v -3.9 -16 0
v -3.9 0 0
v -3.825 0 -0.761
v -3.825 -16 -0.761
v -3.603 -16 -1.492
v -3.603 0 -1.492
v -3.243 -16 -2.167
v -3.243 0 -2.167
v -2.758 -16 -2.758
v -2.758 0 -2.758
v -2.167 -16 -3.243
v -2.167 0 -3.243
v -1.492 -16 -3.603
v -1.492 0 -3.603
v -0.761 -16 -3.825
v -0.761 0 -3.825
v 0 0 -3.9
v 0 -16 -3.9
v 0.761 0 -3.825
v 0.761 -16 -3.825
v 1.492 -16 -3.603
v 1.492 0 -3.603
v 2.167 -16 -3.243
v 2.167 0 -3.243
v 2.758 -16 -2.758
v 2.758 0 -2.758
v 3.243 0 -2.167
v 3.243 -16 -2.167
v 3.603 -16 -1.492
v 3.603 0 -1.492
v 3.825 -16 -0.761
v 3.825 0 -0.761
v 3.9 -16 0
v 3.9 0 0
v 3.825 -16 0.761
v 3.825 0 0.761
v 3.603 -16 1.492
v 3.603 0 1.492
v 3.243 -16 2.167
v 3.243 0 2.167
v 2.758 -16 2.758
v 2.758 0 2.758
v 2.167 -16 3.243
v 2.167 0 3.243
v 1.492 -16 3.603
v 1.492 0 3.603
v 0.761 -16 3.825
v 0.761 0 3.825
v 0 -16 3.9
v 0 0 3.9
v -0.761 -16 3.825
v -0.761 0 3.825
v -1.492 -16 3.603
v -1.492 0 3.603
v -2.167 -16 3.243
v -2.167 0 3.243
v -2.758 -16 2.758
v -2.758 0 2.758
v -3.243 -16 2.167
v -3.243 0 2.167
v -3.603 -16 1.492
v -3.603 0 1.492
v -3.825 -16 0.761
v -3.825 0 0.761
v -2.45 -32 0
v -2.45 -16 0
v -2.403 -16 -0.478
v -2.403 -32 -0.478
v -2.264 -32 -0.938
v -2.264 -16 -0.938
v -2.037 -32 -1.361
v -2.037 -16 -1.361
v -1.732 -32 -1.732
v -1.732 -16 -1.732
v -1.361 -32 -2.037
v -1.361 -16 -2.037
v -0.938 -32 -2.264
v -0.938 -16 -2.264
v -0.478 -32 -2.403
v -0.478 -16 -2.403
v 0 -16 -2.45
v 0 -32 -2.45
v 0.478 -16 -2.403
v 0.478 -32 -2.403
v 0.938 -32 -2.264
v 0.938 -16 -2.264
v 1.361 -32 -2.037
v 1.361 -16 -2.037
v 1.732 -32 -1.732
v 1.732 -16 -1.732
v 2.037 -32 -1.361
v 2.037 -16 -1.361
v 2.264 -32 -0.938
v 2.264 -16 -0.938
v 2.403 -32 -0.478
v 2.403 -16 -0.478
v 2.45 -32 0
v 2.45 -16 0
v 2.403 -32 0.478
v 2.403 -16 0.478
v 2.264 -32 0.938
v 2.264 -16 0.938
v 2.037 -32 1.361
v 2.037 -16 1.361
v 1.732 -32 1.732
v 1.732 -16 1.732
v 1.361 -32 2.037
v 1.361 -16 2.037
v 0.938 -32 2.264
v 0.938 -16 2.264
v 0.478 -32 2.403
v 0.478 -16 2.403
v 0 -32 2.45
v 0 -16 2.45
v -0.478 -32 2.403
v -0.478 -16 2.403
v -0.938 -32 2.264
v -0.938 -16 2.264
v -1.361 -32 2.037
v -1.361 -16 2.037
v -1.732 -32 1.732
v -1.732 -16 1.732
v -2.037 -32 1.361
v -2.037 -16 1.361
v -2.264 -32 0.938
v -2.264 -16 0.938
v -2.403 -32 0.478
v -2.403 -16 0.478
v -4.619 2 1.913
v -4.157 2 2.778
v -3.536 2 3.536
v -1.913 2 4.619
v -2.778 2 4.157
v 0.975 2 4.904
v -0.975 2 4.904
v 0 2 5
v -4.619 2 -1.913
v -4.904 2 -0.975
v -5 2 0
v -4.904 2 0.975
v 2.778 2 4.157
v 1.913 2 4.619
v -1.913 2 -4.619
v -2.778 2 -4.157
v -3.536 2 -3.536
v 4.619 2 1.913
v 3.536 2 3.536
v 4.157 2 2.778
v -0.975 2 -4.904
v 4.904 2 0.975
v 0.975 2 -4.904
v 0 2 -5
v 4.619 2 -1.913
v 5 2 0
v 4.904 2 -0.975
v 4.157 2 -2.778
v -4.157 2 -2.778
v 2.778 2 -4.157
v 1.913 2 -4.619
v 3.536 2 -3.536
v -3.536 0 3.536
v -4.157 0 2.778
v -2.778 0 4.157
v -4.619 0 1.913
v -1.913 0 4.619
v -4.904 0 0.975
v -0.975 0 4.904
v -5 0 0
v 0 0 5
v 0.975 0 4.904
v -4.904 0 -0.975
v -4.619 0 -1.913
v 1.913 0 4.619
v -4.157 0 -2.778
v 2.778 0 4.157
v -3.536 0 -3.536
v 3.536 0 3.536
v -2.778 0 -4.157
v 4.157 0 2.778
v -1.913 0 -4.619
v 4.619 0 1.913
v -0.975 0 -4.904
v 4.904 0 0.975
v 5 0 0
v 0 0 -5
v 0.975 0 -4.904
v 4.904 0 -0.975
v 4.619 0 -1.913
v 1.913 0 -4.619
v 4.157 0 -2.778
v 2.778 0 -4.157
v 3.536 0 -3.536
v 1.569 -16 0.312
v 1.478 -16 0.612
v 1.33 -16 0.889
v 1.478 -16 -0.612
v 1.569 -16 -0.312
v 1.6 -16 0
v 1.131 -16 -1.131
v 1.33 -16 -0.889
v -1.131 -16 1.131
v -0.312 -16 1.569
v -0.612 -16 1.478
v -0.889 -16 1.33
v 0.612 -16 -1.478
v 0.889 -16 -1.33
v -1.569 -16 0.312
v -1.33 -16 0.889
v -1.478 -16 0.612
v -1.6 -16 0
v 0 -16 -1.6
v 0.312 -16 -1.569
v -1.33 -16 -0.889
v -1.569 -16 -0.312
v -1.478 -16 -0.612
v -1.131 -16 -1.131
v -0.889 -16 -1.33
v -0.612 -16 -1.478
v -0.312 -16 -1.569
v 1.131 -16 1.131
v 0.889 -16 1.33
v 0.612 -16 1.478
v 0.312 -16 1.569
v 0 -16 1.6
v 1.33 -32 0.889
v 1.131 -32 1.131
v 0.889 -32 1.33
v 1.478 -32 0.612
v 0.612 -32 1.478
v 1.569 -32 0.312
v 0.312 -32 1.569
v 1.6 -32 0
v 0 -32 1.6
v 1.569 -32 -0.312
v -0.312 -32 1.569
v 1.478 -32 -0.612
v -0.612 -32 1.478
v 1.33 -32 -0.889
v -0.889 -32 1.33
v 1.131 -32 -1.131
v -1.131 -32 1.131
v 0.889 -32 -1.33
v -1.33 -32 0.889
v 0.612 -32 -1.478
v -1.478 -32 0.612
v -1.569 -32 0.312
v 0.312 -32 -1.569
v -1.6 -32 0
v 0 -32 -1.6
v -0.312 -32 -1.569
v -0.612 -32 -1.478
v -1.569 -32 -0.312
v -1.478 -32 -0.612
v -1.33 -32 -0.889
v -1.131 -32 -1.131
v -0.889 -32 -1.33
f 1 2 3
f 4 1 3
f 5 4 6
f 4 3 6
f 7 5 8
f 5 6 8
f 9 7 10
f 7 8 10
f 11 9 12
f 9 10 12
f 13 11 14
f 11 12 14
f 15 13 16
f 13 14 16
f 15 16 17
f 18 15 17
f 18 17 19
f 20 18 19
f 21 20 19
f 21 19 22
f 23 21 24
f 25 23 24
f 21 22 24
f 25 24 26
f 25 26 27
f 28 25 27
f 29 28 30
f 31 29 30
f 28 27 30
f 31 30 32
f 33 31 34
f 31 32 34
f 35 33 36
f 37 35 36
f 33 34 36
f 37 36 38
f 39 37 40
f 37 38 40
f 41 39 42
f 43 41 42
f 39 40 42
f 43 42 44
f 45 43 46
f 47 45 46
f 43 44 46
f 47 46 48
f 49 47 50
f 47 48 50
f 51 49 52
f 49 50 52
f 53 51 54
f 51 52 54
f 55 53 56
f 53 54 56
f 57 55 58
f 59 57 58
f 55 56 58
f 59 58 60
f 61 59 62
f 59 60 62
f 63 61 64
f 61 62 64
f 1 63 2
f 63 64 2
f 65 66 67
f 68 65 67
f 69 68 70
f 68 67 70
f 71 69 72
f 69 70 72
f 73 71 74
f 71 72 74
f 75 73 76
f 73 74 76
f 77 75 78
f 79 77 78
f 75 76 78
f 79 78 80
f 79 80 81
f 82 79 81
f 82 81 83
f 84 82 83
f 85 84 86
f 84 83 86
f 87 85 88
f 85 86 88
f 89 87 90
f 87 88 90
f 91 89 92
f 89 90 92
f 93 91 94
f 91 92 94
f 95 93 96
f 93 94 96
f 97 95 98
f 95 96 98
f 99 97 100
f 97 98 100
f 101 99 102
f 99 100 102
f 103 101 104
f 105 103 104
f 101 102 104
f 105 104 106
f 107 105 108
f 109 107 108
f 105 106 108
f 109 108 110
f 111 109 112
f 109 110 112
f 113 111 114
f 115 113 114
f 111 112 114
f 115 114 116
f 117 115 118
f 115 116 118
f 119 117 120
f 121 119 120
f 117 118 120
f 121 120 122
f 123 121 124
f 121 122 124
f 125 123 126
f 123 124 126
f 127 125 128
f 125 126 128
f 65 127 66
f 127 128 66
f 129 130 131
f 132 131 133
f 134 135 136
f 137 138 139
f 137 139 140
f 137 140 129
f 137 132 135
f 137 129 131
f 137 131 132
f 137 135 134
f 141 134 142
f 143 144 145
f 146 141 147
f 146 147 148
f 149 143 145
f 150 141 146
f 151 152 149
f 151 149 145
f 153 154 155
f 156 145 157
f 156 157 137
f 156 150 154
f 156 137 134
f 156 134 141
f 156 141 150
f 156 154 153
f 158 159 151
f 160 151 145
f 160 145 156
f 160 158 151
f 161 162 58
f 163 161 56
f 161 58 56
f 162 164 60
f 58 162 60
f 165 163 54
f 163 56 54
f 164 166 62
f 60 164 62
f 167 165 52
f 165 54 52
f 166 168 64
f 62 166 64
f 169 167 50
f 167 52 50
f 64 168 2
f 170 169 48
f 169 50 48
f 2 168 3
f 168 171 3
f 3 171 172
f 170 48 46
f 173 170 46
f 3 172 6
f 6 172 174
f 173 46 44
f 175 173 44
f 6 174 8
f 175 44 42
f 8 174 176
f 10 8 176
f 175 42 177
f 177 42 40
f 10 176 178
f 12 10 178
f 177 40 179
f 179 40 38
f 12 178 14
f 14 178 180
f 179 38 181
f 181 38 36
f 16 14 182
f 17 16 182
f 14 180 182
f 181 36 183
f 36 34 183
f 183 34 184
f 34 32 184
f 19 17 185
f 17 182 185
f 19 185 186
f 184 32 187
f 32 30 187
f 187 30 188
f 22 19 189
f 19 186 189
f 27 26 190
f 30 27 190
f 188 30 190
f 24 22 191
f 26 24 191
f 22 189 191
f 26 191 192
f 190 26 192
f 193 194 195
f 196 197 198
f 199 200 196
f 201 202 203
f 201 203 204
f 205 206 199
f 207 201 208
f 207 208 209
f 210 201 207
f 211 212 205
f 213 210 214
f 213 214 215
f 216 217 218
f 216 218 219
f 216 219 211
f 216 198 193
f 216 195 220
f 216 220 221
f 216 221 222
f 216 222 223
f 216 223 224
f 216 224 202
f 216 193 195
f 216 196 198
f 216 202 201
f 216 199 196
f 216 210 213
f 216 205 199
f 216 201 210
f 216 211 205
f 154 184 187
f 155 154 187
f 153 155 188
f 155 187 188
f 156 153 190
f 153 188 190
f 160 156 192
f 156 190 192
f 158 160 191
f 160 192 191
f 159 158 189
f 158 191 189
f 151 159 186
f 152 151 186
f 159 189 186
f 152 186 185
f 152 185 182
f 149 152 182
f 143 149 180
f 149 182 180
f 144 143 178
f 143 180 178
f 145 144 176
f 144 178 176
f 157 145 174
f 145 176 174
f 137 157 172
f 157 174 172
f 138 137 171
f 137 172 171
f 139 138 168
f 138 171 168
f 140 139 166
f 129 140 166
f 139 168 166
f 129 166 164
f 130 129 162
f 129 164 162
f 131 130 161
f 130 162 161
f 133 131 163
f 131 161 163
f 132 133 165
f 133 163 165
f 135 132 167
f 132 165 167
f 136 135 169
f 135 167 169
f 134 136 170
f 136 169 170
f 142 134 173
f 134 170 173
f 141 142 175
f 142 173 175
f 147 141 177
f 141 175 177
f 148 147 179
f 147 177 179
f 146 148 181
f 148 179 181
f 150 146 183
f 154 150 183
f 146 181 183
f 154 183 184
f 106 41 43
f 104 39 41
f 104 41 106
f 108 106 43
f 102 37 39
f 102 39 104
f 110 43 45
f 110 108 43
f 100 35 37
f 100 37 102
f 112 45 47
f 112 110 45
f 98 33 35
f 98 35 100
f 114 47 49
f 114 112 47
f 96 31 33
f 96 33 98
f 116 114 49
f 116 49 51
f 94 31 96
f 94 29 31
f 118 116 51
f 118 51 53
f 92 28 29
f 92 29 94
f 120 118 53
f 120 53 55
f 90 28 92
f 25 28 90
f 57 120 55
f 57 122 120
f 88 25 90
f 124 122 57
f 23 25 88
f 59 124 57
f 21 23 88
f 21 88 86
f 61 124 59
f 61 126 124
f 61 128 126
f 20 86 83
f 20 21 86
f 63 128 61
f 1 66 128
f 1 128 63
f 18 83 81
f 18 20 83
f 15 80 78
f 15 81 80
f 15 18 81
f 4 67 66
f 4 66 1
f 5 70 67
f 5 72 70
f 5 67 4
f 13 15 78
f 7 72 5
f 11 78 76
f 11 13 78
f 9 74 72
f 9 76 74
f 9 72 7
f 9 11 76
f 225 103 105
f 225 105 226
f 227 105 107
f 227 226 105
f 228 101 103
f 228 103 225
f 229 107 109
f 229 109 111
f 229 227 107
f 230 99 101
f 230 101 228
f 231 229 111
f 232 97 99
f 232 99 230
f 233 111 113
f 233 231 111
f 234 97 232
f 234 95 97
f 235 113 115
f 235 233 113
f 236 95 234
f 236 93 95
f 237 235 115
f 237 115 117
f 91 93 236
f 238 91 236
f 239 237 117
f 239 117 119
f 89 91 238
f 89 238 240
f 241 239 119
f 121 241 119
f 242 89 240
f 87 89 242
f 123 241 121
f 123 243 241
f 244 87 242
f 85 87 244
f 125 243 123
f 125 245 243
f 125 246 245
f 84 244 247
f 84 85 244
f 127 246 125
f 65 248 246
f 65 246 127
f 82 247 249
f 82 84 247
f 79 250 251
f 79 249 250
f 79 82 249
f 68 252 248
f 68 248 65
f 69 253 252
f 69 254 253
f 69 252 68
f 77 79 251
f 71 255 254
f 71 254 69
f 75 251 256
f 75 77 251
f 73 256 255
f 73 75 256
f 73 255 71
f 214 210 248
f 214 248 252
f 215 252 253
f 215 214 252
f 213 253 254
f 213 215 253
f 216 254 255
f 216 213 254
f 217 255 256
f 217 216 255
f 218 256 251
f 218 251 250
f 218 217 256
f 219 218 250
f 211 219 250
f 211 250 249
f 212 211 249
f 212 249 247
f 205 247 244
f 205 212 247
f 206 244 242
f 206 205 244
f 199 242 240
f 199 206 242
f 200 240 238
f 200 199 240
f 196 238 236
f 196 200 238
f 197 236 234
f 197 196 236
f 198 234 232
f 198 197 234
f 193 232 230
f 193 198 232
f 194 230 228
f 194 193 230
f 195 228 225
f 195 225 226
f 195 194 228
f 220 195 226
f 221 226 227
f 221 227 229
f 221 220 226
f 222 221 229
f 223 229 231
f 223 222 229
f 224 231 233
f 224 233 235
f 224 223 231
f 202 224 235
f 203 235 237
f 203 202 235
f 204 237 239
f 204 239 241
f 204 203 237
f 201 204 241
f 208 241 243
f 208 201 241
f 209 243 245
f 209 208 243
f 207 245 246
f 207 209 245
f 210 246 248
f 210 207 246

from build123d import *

# Parameters (mm, degrees)
SKETCH1_R           = 5
BOSS_EXTRUDE1_DEPTH = 2
SKETCH4_R           = 3.9
BOSS_EXTRUDE2_DEPTH = 16
SKETCH6_R           = 2.45
SKETCH6_R_2         = 1.6
BOSS_EXTRUDE3_DEPTH = 16


with BuildPart() as part:
    # Sketch1 → Boss-Extrude1 (new body)
    with BuildSketch(Plane(origin=(0, 0, 0), x_dir=(1, 0, 0), z_dir=(0, 1, 0))):
        Circle(SKETCH1_R)
    extrude(amount=BOSS_EXTRUDE1_DEPTH)

    # Sketch4 → Boss-Extrude2 (add)
    with BuildSketch(Plane(origin=(0, 0, 0), x_dir=(-1, 0, 0), z_dir=(0, -1, 0))):
        Circle(SKETCH4_R)
    extrude(amount=BOSS_EXTRUDE2_DEPTH)

    # Sketch6 → Boss-Extrude3 (add)
    with BuildSketch(Plane(origin=(0, -16, 0), x_dir=(-1, 0, 0), z_dir=(0, -1, 0))):
        Circle(SKETCH6_R)
        Circle(SKETCH6_R_2, mode=Mode.SUBTRACT)
    extrude(amount=BOSS_EXTRUDE3_DEPTH)


solid = part.part
